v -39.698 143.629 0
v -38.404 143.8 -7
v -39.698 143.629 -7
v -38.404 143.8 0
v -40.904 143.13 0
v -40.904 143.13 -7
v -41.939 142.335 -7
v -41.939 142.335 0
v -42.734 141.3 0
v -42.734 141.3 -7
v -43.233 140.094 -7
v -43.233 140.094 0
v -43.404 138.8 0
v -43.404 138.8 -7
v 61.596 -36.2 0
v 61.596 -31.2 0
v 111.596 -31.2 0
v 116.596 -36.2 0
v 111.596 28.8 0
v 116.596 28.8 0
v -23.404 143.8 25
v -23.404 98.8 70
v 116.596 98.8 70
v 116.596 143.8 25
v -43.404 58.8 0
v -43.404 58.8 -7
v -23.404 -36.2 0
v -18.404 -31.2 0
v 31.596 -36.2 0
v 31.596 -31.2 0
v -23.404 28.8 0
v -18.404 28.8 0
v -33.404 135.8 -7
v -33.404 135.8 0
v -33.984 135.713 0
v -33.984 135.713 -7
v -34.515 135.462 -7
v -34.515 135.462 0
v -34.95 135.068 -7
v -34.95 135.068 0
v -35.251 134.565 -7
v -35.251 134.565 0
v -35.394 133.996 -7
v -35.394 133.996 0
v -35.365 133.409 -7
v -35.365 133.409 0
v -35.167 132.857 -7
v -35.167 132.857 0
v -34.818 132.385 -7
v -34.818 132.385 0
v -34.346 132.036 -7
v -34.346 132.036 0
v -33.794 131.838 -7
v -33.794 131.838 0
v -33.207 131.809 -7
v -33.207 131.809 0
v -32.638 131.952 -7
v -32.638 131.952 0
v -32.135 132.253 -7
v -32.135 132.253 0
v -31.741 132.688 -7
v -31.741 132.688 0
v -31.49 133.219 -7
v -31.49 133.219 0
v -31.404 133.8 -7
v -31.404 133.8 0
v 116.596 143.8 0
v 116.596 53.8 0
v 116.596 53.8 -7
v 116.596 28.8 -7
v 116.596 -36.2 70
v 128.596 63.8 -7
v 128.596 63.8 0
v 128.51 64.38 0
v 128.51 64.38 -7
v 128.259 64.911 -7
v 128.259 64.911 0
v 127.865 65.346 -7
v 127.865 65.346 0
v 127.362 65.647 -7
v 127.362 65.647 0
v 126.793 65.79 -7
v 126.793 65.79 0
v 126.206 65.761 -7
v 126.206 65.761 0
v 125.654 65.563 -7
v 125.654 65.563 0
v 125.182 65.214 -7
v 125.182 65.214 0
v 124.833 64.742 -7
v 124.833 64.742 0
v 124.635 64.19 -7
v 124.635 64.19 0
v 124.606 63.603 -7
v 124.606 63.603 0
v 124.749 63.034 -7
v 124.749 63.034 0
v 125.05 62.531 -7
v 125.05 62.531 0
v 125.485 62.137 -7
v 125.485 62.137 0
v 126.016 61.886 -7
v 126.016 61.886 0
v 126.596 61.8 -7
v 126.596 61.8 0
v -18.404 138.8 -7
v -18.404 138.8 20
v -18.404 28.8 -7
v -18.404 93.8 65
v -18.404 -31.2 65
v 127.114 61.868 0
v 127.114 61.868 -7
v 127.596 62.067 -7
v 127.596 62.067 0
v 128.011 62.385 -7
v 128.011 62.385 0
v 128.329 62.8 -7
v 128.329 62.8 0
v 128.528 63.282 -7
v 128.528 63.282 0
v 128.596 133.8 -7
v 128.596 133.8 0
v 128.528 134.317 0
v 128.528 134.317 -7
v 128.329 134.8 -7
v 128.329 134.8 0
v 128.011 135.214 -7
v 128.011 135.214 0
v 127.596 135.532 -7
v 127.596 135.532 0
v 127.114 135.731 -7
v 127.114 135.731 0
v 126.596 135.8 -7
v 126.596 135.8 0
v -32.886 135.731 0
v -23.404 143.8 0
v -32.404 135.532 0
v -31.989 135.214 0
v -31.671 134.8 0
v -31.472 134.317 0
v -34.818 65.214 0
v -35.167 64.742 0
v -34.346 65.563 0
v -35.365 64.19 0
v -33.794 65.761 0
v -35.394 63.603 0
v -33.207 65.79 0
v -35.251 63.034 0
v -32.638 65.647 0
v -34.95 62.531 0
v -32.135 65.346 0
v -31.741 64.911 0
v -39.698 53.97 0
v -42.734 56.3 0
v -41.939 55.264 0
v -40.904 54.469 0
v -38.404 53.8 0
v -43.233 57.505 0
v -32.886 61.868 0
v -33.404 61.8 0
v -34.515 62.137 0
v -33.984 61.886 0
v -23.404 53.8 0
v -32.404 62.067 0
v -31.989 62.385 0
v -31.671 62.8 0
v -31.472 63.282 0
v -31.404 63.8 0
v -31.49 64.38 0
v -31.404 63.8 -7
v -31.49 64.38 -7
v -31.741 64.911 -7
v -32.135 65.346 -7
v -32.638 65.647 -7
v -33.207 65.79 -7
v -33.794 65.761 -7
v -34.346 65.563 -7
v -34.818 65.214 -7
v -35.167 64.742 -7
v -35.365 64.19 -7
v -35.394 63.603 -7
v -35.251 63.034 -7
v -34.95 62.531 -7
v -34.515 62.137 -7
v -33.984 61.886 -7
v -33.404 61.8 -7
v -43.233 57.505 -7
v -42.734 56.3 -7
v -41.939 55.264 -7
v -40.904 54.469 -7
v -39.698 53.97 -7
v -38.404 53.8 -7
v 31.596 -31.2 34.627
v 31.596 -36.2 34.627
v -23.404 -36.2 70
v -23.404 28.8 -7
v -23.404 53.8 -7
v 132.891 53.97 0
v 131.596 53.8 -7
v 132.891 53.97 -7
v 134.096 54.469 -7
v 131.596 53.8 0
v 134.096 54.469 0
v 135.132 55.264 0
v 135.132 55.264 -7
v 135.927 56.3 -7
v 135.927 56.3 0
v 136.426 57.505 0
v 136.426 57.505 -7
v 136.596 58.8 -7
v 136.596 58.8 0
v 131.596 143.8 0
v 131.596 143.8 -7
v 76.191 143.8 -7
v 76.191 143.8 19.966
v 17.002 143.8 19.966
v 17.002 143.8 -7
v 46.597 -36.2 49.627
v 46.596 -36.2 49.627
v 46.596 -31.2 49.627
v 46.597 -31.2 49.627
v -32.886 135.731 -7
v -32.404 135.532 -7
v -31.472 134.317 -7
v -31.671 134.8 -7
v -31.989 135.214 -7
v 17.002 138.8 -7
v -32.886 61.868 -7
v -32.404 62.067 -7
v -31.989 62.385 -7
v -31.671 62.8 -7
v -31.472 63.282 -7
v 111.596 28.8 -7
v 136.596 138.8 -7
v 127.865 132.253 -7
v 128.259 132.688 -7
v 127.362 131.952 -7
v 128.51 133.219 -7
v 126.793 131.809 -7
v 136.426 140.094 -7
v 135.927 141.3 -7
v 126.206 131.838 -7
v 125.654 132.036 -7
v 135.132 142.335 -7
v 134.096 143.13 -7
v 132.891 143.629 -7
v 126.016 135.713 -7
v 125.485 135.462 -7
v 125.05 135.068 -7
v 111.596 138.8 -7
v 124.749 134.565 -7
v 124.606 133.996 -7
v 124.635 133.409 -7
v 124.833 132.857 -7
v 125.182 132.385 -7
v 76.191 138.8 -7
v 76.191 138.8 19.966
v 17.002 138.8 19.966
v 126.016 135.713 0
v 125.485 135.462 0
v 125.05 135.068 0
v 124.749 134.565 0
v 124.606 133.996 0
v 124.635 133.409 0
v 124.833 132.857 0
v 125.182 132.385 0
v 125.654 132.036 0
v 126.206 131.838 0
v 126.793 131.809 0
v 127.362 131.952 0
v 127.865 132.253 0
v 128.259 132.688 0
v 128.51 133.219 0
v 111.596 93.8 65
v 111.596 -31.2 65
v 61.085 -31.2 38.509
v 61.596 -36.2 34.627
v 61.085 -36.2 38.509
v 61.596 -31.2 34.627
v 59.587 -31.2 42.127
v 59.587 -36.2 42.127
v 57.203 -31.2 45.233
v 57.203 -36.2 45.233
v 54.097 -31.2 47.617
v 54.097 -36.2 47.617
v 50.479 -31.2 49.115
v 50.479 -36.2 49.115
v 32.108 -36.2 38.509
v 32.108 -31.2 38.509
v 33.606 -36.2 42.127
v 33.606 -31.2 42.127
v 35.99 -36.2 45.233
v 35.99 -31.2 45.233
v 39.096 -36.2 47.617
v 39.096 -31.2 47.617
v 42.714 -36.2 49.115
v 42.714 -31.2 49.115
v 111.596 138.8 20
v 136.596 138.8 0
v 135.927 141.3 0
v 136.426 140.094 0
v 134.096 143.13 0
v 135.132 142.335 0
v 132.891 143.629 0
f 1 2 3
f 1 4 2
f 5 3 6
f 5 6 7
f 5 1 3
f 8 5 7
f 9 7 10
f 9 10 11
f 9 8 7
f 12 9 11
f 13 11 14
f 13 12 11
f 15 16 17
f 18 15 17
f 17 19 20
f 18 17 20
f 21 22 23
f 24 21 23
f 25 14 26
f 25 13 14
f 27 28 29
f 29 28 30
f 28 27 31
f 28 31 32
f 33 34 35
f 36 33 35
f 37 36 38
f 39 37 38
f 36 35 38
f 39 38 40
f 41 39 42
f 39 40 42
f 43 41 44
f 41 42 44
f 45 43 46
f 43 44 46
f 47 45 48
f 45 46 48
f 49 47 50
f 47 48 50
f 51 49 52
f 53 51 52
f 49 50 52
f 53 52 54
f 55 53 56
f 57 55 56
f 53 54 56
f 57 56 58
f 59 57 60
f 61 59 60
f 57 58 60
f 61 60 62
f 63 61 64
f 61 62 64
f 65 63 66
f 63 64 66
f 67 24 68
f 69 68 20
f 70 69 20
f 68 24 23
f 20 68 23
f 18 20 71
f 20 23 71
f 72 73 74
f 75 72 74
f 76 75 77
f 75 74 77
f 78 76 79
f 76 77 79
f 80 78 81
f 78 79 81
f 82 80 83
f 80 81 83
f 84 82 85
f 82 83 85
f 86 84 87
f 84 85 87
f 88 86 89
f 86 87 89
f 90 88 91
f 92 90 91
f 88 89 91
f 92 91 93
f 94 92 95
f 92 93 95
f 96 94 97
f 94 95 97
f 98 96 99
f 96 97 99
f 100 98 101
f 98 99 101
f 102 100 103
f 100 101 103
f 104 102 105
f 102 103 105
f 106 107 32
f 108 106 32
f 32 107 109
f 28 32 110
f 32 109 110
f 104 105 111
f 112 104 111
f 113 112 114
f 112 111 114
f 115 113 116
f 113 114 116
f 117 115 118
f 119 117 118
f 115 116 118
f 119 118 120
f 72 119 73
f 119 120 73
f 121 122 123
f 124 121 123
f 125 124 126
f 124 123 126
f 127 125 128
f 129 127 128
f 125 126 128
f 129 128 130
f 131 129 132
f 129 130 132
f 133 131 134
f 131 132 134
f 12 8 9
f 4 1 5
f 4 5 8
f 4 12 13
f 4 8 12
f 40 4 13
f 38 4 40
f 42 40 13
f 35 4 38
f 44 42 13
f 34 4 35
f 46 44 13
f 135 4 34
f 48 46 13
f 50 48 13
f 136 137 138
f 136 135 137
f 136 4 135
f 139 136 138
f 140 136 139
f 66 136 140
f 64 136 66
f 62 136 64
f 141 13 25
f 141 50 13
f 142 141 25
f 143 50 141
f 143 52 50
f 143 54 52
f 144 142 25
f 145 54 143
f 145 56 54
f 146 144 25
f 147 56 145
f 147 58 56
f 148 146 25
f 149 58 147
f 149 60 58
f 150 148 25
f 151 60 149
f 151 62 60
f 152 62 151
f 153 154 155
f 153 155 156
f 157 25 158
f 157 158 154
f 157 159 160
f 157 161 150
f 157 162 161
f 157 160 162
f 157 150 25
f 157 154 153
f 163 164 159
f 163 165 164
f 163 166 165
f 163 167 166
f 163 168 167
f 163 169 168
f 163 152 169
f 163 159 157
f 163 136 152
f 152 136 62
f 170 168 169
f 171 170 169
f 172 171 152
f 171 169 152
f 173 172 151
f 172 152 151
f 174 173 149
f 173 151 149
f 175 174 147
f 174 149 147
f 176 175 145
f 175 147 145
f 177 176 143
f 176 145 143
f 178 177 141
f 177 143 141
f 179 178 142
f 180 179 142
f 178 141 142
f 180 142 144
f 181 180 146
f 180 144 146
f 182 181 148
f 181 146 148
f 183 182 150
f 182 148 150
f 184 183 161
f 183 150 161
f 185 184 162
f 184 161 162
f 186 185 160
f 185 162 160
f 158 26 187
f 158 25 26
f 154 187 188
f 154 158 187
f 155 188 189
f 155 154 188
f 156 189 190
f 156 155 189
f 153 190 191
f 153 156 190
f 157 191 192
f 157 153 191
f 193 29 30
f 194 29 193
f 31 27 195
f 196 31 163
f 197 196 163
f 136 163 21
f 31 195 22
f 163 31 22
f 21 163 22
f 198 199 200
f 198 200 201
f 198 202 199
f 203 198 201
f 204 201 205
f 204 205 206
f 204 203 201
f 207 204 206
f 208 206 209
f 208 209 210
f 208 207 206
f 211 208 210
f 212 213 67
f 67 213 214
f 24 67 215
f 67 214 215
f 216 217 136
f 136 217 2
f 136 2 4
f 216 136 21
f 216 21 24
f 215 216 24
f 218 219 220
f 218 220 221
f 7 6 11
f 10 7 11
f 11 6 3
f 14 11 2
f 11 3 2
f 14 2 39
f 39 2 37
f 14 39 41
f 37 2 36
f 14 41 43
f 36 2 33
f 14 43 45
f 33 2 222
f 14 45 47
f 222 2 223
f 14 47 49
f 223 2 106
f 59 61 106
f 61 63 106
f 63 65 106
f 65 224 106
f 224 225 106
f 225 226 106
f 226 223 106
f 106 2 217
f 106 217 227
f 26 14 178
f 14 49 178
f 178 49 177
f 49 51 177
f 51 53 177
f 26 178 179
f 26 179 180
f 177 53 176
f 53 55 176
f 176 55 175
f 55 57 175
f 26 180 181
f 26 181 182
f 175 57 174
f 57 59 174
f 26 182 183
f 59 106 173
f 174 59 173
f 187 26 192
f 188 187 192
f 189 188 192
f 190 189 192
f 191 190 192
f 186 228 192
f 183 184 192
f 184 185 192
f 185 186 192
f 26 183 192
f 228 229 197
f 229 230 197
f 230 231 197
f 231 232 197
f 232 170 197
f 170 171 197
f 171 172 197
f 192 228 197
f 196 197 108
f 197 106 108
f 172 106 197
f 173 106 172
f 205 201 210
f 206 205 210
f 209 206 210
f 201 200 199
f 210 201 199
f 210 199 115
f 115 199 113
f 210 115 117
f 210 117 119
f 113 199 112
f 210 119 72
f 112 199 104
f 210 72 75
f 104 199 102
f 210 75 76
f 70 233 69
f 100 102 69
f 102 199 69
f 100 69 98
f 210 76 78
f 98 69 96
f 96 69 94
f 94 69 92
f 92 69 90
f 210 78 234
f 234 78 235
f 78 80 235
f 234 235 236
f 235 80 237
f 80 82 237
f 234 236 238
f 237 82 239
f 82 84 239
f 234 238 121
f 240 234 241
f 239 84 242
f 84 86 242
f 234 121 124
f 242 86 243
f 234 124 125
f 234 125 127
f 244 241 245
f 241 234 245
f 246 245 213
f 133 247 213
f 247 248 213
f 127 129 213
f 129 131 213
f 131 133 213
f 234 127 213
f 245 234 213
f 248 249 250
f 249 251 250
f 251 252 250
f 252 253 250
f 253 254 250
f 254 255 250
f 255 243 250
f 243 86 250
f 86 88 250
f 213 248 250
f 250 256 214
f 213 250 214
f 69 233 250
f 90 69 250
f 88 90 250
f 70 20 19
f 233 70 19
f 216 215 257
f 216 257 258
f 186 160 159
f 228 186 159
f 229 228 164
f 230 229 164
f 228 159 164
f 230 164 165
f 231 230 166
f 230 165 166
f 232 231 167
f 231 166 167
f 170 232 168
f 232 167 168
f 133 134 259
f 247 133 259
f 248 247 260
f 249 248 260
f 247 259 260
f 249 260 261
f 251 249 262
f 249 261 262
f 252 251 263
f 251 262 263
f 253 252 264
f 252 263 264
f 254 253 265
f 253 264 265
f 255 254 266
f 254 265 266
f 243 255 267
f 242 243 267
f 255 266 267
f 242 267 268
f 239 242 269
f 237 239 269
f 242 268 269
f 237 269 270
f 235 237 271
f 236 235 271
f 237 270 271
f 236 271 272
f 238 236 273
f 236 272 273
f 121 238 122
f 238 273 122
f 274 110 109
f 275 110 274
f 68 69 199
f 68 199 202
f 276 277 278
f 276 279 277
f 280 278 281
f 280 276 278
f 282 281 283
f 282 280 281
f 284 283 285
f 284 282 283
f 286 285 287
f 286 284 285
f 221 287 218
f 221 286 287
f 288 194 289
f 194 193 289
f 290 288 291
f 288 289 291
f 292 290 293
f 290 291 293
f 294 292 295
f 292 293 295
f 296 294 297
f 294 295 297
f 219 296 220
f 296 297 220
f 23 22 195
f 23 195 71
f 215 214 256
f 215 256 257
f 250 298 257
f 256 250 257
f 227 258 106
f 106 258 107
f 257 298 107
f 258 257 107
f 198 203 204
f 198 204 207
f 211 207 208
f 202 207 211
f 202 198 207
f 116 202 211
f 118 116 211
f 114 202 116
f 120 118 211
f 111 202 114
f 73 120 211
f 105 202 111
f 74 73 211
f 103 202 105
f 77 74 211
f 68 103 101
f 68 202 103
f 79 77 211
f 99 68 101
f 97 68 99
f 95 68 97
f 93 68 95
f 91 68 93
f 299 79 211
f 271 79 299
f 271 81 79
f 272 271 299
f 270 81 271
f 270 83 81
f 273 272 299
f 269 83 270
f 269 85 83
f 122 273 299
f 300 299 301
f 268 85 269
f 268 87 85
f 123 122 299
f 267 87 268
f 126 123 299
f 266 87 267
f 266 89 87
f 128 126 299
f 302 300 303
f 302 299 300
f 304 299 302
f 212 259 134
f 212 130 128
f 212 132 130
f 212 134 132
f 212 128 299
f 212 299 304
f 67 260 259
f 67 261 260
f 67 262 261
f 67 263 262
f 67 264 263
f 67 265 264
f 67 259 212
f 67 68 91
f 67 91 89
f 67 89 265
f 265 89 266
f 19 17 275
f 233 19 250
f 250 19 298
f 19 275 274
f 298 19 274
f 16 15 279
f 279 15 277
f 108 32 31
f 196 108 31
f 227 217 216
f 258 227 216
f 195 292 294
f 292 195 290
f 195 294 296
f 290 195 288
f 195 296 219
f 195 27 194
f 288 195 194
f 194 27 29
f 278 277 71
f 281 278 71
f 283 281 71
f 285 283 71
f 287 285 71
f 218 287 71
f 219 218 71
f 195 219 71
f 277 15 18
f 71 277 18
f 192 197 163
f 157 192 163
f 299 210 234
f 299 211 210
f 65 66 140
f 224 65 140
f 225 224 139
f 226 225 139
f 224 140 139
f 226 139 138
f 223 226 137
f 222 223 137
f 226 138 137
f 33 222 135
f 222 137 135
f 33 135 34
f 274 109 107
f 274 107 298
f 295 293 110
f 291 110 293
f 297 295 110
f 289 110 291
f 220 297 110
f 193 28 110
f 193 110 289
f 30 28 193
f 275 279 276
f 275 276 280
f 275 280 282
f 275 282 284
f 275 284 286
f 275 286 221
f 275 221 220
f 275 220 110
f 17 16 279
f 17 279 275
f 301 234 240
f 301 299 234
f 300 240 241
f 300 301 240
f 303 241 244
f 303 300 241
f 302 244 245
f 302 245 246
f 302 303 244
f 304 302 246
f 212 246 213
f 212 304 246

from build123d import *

# Parameters (mm, degrees)
F0_W      = 140
F0_H      = 180
F1_DEPTH  = 70
F2_W      = 130
F2_H      = 170
F3_DEPTH  = 65
F4_SIZE   = 45
F5_W      = 30
F5_H      = 49.6265143156
F6_DEPTH  = 25
F7_R      = 14.99999
F9_DEPTH  = 7
F10_W     = 59.1894394159
F10_H     = 26.9657306075
F11_DEPTH = 25
F12_W     = 90
F12_H     = 7
F13_DEPTH = 20
F14_W     = 90
F14_H     = 7
F15_DEPTH = 20
F17_DEPTH = 25
F19_DEPTH = 25
F20_R     = 5


# Not quite as in the source:
# - a fillet or chamfer is up to 0.001 mm smaller than in the source, because OpenCascade refuses the exact size


with BuildPart() as f1:
    # F0 (on Top) → F1 (new body)
    with BuildSketch(Plane.XY):
        with Locations((46.5964969993, 53.7995101511)):
            Rectangle(F0_W, F0_H)
    extrude(amount=F1_DEPTH)

    # F2 (on face) → F3 (cut)
    with BuildSketch(Plane(origin=(0, 0, 0), x_dir=(1, 0, 0), z_dir=(0, 0, -1))):
        with Locations((46.5964969993, -53.7995101511)):
            Rectangle(F2_W, F2_H)
    extrude(amount=-F3_DEPTH, mode=Mode.SUBTRACT)

    # F4
    f4_edges = [f1.edges().sort_by_distance(p)[0] for p in [
        (46.596497, 143.79951, 70),
        (46.596497, 138.79951, 65),
    ]]
    chamfer(f4_edges, length=F4_SIZE)

    # F5 (on face) → F6 (cut)
    with BuildSketch(Plane.XZ.offset(36.2004898489)):
        with Locations((46.5964969993, 24.8132571578)):
            Rectangle(F5_W, F5_H)
    extrude(amount=-F6_DEPTH, mode=Mode.SUBTRACT)

    # F7 (radius 15 in the source; OpenCascade refuses exactly that, so slightly less here)
    f7_edges = [f1.edges().sort_by_distance(p)[0] for p in [
        (61.596497, -33.70049, 49.626514),
        (31.596497, -33.70049, 49.626514),
    ]]
    fillet(f7_edges, radius=F7_R)

    # F8 (on face) → F9 (join)
    with BuildSketch(Plane(origin=(0, 0, 0), x_dir=(1, 0, 0), z_dir=(0, 0, -1))):
        Polygon((-23.4035030007, -28.7995101511), (-23.4035030007, -143.7995101511), (116.5964969993, -143.7995101511), (116.5964969993, -28.7995101511), (111.5964969993, -28.7995101511), (111.5964969993, -138.7995101511), (-18.4035030007, -138.7995101511), (-18.4035030007, -28.7995101511), align=None)
    extrude(amount=F9_DEPTH)

    # F10 (on face) → F11 (cut)
    with BuildSketch(Plane(origin=(0, 143.7995101511, 0), x_dir=(-1, 0, 0), z_dir=(0, 1, 0))):
        with Locations((-46.5964969993, 6.4828653038)):
            Rectangle(F10_W, F10_H)
    extrude(amount=-F11_DEPTH, mode=Mode.SUBTRACT)

    # F12 (on face) → F13 (join)
    with BuildSketch(Plane(origin=(-23.4035030007, 0, 0), x_dir=(0, -1, 0), z_dir=(-1, 0, 0))):
        with Locations((-98.7995101511, -3.5)):
            Rectangle(F12_W, F12_H)
    extrude(amount=F13_DEPTH)

    # F14 (on face) → F15 (join)
    with BuildSketch(Plane.YZ.offset(116.5964969993)):
        with Locations((98.7995101511, -3.5)):
            Rectangle(F14_W, F14_H)
    extrude(amount=F15_DEPTH)

    # F16 (on face) → F17 (cut)
    with BuildSketch(Plane.XY):
        with BuildLine():
            ThreePointArc((-33.4035030007, 135.7995101511), (-34.8177165631, 132.3852965888), (-31.4035030007, 133.7995101511))
            ThreePointArc((-31.4035030007, 133.7995101511), (-31.9892894384, 135.2137237135), (-33.4035030007, 135.7995101511))
        make_face()
        with BuildLine():
            ThreePointArc((-33.4035030007, 61.7995101511), (-31.9892894384, 62.3852965888), (-31.4035030007, 63.7995101511))
            ThreePointArc((-31.4035030007, 63.7995101511), (-34.8177165631, 65.2137237135), (-33.4035030007, 61.7995101511))
        make_face()
    extrude(amount=-F17_DEPTH, mode=Mode.SUBTRACT)

    # F18 (on face) → F19 (cut)
    with BuildSketch(Plane.XY):
        with BuildLine():
            ThreePointArc((126.5964969993, 61.7995101511), (128.0107105616, 62.3852965888), (128.5964969993, 63.7995101511))
            ThreePointArc((128.5964969993, 63.7995101511), (125.1822834369, 65.2137237135), (126.5964969993, 61.7995101511))
        make_face()
        with BuildLine():
            ThreePointArc((126.5964969993, 135.7995101511), (125.1822834369, 132.3852965888), (128.5964969993, 133.7995101511))
            ThreePointArc((128.5964969993, 133.7995101511), (128.0107105616, 135.2137237135), (126.5964969993, 135.7995101511))
        make_face()
    extrude(amount=-F19_DEPTH, mode=Mode.SUBTRACT)

    # F20
    f20_edges = [f1.edges().sort_by_distance(p)[0] for p in [
        (-43.403503, 53.79951, -3.5),
        (-43.403503, 143.79951, -3.5),
        (136.596497, 143.79951, -3.5),
        (136.596497, 53.79951, -3.5),
    ]]
    fillet(f20_edges, radius=F20_R)


solid = f1.part
